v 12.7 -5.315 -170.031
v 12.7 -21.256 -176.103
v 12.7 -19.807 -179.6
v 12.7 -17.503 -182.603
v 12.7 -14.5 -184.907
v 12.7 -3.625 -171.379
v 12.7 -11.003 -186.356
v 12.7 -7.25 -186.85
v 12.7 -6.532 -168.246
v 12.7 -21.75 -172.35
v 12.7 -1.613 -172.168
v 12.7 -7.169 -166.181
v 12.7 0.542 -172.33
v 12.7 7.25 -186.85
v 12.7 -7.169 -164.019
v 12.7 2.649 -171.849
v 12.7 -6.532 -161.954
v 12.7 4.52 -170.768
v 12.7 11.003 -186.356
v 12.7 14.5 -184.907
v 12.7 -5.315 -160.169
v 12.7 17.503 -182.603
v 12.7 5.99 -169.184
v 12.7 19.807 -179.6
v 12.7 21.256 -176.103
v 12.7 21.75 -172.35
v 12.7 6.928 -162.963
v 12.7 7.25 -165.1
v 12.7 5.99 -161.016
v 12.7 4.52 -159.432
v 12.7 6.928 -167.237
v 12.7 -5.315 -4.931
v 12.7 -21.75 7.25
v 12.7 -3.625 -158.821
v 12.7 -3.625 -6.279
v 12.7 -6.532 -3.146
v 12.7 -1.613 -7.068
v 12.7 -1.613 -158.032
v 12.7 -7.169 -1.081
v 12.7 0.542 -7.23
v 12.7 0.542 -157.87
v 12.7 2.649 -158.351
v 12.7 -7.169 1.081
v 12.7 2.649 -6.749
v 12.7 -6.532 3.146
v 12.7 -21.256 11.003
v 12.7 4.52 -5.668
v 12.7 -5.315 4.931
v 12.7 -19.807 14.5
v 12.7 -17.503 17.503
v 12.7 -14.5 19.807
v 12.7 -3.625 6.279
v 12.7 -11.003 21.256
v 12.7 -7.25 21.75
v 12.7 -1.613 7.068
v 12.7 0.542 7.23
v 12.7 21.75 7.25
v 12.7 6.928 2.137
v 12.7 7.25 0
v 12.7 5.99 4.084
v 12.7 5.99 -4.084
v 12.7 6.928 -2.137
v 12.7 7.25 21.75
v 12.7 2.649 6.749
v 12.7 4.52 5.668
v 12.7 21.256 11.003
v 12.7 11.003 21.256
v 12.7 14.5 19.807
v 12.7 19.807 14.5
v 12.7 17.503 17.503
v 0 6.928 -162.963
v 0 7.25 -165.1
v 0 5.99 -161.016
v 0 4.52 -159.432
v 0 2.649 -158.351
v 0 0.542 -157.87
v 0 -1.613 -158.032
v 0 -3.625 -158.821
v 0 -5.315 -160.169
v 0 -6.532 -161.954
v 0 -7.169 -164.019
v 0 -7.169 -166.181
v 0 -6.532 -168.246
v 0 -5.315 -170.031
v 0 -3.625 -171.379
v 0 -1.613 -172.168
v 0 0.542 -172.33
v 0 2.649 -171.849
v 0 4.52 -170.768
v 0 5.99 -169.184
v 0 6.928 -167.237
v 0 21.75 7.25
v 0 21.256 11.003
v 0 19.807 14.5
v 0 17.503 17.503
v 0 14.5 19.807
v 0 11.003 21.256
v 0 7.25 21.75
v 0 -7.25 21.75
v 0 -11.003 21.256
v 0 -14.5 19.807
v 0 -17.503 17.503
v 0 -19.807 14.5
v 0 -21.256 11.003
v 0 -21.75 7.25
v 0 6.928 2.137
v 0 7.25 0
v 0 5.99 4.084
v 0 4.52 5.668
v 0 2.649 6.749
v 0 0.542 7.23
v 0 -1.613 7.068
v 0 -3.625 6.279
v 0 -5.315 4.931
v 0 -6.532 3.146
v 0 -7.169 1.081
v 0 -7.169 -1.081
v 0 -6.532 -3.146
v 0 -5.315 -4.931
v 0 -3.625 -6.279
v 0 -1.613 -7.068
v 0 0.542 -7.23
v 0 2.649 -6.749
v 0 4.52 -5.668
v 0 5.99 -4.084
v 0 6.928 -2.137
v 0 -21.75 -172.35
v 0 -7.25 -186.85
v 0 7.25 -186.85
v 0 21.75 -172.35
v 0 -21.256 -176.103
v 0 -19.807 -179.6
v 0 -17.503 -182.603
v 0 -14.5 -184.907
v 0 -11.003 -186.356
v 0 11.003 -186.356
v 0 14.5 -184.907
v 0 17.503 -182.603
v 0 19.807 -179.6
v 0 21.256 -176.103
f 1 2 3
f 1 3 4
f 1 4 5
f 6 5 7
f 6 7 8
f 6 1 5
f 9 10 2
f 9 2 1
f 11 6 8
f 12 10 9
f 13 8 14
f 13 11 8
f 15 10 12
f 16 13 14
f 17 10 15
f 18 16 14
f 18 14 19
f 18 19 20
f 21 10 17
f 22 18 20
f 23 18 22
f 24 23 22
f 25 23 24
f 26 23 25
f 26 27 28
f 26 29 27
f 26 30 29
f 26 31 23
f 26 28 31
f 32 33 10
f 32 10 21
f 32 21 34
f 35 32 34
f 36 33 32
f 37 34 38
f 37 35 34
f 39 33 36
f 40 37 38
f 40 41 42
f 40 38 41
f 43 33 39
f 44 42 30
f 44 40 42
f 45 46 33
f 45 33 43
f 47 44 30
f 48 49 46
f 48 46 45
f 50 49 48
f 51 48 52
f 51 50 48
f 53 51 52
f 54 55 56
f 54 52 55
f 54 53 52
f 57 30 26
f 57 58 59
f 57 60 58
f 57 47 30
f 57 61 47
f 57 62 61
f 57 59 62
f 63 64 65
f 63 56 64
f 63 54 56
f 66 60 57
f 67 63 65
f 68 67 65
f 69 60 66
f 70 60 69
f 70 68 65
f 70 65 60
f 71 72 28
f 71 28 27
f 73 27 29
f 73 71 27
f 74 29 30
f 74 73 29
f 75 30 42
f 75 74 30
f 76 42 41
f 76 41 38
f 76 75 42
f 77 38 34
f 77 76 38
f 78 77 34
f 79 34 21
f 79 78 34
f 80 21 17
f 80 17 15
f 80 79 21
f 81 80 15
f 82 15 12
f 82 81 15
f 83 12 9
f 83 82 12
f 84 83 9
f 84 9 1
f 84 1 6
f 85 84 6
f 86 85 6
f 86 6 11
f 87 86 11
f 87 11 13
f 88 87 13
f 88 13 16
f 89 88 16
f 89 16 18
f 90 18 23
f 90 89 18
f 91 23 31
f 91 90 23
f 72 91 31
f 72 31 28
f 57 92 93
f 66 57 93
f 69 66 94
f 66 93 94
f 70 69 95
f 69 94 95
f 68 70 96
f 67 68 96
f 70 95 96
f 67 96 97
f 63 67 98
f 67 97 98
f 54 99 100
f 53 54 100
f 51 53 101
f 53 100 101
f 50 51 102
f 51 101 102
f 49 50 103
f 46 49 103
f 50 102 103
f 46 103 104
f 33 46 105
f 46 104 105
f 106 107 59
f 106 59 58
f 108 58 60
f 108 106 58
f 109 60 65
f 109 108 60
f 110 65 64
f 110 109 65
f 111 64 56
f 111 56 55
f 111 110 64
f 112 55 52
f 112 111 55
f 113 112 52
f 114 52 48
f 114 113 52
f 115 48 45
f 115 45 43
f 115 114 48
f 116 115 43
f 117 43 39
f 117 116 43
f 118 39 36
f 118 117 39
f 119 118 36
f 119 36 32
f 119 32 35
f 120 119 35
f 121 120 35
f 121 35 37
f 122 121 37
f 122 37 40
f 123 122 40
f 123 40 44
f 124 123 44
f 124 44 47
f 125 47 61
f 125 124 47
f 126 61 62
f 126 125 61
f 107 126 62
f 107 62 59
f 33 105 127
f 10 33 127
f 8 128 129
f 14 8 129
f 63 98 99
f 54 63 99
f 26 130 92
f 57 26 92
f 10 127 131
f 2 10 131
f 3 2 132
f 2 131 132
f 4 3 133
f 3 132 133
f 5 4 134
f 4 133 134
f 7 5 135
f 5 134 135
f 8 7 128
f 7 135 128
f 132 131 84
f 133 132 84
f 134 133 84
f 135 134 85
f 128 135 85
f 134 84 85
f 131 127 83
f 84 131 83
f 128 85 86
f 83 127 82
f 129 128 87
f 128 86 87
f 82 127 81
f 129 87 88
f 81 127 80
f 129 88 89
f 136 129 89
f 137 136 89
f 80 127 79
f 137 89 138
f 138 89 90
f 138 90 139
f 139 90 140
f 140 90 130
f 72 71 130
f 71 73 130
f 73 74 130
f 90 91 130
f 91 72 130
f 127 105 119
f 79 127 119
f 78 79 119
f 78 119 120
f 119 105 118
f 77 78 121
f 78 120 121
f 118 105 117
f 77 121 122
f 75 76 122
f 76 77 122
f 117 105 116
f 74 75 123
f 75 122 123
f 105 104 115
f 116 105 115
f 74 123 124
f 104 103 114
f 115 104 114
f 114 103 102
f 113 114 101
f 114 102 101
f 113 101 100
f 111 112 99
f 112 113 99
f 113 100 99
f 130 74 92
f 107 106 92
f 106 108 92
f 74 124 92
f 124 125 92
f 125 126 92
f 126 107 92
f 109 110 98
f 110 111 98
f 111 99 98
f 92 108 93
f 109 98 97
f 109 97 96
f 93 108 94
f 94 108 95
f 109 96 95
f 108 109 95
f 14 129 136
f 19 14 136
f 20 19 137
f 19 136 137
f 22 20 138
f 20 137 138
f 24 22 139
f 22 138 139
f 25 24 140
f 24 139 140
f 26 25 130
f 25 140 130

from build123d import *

# Parameters (mm, degrees)
F0_R     = 7.25
F1_DEPTH = 12.7


with BuildPart() as f1:
    # F0 (on Right) → F1 (new body)
    with BuildSketch(Plane.YZ):
        with BuildLine():
            Line((7.25, 21.75), (-7.25, 21.75))
            ThreePointArc((-7.25, 21.75), (-17.503048, 17.503048), (-21.75, 7.25))
            Line((-21.75, 7.25), (-21.75, -172.35))
            ThreePointArc((-21.75, -172.35), (-17.503048, -182.603048), (-7.25, -186.85))
            Line((-7.25, -186.85), (7.25, -186.85))
            ThreePointArc((7.25, -186.85), (17.503048, -182.603048), (21.75, -172.35))
            Line((21.75, -172.35), (21.75, 7.25))
            ThreePointArc((21.75, 7.25), (17.503048, 17.503048), (7.25, 21.75))
        make_face()
        with Locations((0, -165.1)):
            Circle(F0_R, mode=Mode.SUBTRACT)
        Circle(F0_R, mode=Mode.SUBTRACT)
    extrude(amount=F1_DEPTH)


solid = f1.part
